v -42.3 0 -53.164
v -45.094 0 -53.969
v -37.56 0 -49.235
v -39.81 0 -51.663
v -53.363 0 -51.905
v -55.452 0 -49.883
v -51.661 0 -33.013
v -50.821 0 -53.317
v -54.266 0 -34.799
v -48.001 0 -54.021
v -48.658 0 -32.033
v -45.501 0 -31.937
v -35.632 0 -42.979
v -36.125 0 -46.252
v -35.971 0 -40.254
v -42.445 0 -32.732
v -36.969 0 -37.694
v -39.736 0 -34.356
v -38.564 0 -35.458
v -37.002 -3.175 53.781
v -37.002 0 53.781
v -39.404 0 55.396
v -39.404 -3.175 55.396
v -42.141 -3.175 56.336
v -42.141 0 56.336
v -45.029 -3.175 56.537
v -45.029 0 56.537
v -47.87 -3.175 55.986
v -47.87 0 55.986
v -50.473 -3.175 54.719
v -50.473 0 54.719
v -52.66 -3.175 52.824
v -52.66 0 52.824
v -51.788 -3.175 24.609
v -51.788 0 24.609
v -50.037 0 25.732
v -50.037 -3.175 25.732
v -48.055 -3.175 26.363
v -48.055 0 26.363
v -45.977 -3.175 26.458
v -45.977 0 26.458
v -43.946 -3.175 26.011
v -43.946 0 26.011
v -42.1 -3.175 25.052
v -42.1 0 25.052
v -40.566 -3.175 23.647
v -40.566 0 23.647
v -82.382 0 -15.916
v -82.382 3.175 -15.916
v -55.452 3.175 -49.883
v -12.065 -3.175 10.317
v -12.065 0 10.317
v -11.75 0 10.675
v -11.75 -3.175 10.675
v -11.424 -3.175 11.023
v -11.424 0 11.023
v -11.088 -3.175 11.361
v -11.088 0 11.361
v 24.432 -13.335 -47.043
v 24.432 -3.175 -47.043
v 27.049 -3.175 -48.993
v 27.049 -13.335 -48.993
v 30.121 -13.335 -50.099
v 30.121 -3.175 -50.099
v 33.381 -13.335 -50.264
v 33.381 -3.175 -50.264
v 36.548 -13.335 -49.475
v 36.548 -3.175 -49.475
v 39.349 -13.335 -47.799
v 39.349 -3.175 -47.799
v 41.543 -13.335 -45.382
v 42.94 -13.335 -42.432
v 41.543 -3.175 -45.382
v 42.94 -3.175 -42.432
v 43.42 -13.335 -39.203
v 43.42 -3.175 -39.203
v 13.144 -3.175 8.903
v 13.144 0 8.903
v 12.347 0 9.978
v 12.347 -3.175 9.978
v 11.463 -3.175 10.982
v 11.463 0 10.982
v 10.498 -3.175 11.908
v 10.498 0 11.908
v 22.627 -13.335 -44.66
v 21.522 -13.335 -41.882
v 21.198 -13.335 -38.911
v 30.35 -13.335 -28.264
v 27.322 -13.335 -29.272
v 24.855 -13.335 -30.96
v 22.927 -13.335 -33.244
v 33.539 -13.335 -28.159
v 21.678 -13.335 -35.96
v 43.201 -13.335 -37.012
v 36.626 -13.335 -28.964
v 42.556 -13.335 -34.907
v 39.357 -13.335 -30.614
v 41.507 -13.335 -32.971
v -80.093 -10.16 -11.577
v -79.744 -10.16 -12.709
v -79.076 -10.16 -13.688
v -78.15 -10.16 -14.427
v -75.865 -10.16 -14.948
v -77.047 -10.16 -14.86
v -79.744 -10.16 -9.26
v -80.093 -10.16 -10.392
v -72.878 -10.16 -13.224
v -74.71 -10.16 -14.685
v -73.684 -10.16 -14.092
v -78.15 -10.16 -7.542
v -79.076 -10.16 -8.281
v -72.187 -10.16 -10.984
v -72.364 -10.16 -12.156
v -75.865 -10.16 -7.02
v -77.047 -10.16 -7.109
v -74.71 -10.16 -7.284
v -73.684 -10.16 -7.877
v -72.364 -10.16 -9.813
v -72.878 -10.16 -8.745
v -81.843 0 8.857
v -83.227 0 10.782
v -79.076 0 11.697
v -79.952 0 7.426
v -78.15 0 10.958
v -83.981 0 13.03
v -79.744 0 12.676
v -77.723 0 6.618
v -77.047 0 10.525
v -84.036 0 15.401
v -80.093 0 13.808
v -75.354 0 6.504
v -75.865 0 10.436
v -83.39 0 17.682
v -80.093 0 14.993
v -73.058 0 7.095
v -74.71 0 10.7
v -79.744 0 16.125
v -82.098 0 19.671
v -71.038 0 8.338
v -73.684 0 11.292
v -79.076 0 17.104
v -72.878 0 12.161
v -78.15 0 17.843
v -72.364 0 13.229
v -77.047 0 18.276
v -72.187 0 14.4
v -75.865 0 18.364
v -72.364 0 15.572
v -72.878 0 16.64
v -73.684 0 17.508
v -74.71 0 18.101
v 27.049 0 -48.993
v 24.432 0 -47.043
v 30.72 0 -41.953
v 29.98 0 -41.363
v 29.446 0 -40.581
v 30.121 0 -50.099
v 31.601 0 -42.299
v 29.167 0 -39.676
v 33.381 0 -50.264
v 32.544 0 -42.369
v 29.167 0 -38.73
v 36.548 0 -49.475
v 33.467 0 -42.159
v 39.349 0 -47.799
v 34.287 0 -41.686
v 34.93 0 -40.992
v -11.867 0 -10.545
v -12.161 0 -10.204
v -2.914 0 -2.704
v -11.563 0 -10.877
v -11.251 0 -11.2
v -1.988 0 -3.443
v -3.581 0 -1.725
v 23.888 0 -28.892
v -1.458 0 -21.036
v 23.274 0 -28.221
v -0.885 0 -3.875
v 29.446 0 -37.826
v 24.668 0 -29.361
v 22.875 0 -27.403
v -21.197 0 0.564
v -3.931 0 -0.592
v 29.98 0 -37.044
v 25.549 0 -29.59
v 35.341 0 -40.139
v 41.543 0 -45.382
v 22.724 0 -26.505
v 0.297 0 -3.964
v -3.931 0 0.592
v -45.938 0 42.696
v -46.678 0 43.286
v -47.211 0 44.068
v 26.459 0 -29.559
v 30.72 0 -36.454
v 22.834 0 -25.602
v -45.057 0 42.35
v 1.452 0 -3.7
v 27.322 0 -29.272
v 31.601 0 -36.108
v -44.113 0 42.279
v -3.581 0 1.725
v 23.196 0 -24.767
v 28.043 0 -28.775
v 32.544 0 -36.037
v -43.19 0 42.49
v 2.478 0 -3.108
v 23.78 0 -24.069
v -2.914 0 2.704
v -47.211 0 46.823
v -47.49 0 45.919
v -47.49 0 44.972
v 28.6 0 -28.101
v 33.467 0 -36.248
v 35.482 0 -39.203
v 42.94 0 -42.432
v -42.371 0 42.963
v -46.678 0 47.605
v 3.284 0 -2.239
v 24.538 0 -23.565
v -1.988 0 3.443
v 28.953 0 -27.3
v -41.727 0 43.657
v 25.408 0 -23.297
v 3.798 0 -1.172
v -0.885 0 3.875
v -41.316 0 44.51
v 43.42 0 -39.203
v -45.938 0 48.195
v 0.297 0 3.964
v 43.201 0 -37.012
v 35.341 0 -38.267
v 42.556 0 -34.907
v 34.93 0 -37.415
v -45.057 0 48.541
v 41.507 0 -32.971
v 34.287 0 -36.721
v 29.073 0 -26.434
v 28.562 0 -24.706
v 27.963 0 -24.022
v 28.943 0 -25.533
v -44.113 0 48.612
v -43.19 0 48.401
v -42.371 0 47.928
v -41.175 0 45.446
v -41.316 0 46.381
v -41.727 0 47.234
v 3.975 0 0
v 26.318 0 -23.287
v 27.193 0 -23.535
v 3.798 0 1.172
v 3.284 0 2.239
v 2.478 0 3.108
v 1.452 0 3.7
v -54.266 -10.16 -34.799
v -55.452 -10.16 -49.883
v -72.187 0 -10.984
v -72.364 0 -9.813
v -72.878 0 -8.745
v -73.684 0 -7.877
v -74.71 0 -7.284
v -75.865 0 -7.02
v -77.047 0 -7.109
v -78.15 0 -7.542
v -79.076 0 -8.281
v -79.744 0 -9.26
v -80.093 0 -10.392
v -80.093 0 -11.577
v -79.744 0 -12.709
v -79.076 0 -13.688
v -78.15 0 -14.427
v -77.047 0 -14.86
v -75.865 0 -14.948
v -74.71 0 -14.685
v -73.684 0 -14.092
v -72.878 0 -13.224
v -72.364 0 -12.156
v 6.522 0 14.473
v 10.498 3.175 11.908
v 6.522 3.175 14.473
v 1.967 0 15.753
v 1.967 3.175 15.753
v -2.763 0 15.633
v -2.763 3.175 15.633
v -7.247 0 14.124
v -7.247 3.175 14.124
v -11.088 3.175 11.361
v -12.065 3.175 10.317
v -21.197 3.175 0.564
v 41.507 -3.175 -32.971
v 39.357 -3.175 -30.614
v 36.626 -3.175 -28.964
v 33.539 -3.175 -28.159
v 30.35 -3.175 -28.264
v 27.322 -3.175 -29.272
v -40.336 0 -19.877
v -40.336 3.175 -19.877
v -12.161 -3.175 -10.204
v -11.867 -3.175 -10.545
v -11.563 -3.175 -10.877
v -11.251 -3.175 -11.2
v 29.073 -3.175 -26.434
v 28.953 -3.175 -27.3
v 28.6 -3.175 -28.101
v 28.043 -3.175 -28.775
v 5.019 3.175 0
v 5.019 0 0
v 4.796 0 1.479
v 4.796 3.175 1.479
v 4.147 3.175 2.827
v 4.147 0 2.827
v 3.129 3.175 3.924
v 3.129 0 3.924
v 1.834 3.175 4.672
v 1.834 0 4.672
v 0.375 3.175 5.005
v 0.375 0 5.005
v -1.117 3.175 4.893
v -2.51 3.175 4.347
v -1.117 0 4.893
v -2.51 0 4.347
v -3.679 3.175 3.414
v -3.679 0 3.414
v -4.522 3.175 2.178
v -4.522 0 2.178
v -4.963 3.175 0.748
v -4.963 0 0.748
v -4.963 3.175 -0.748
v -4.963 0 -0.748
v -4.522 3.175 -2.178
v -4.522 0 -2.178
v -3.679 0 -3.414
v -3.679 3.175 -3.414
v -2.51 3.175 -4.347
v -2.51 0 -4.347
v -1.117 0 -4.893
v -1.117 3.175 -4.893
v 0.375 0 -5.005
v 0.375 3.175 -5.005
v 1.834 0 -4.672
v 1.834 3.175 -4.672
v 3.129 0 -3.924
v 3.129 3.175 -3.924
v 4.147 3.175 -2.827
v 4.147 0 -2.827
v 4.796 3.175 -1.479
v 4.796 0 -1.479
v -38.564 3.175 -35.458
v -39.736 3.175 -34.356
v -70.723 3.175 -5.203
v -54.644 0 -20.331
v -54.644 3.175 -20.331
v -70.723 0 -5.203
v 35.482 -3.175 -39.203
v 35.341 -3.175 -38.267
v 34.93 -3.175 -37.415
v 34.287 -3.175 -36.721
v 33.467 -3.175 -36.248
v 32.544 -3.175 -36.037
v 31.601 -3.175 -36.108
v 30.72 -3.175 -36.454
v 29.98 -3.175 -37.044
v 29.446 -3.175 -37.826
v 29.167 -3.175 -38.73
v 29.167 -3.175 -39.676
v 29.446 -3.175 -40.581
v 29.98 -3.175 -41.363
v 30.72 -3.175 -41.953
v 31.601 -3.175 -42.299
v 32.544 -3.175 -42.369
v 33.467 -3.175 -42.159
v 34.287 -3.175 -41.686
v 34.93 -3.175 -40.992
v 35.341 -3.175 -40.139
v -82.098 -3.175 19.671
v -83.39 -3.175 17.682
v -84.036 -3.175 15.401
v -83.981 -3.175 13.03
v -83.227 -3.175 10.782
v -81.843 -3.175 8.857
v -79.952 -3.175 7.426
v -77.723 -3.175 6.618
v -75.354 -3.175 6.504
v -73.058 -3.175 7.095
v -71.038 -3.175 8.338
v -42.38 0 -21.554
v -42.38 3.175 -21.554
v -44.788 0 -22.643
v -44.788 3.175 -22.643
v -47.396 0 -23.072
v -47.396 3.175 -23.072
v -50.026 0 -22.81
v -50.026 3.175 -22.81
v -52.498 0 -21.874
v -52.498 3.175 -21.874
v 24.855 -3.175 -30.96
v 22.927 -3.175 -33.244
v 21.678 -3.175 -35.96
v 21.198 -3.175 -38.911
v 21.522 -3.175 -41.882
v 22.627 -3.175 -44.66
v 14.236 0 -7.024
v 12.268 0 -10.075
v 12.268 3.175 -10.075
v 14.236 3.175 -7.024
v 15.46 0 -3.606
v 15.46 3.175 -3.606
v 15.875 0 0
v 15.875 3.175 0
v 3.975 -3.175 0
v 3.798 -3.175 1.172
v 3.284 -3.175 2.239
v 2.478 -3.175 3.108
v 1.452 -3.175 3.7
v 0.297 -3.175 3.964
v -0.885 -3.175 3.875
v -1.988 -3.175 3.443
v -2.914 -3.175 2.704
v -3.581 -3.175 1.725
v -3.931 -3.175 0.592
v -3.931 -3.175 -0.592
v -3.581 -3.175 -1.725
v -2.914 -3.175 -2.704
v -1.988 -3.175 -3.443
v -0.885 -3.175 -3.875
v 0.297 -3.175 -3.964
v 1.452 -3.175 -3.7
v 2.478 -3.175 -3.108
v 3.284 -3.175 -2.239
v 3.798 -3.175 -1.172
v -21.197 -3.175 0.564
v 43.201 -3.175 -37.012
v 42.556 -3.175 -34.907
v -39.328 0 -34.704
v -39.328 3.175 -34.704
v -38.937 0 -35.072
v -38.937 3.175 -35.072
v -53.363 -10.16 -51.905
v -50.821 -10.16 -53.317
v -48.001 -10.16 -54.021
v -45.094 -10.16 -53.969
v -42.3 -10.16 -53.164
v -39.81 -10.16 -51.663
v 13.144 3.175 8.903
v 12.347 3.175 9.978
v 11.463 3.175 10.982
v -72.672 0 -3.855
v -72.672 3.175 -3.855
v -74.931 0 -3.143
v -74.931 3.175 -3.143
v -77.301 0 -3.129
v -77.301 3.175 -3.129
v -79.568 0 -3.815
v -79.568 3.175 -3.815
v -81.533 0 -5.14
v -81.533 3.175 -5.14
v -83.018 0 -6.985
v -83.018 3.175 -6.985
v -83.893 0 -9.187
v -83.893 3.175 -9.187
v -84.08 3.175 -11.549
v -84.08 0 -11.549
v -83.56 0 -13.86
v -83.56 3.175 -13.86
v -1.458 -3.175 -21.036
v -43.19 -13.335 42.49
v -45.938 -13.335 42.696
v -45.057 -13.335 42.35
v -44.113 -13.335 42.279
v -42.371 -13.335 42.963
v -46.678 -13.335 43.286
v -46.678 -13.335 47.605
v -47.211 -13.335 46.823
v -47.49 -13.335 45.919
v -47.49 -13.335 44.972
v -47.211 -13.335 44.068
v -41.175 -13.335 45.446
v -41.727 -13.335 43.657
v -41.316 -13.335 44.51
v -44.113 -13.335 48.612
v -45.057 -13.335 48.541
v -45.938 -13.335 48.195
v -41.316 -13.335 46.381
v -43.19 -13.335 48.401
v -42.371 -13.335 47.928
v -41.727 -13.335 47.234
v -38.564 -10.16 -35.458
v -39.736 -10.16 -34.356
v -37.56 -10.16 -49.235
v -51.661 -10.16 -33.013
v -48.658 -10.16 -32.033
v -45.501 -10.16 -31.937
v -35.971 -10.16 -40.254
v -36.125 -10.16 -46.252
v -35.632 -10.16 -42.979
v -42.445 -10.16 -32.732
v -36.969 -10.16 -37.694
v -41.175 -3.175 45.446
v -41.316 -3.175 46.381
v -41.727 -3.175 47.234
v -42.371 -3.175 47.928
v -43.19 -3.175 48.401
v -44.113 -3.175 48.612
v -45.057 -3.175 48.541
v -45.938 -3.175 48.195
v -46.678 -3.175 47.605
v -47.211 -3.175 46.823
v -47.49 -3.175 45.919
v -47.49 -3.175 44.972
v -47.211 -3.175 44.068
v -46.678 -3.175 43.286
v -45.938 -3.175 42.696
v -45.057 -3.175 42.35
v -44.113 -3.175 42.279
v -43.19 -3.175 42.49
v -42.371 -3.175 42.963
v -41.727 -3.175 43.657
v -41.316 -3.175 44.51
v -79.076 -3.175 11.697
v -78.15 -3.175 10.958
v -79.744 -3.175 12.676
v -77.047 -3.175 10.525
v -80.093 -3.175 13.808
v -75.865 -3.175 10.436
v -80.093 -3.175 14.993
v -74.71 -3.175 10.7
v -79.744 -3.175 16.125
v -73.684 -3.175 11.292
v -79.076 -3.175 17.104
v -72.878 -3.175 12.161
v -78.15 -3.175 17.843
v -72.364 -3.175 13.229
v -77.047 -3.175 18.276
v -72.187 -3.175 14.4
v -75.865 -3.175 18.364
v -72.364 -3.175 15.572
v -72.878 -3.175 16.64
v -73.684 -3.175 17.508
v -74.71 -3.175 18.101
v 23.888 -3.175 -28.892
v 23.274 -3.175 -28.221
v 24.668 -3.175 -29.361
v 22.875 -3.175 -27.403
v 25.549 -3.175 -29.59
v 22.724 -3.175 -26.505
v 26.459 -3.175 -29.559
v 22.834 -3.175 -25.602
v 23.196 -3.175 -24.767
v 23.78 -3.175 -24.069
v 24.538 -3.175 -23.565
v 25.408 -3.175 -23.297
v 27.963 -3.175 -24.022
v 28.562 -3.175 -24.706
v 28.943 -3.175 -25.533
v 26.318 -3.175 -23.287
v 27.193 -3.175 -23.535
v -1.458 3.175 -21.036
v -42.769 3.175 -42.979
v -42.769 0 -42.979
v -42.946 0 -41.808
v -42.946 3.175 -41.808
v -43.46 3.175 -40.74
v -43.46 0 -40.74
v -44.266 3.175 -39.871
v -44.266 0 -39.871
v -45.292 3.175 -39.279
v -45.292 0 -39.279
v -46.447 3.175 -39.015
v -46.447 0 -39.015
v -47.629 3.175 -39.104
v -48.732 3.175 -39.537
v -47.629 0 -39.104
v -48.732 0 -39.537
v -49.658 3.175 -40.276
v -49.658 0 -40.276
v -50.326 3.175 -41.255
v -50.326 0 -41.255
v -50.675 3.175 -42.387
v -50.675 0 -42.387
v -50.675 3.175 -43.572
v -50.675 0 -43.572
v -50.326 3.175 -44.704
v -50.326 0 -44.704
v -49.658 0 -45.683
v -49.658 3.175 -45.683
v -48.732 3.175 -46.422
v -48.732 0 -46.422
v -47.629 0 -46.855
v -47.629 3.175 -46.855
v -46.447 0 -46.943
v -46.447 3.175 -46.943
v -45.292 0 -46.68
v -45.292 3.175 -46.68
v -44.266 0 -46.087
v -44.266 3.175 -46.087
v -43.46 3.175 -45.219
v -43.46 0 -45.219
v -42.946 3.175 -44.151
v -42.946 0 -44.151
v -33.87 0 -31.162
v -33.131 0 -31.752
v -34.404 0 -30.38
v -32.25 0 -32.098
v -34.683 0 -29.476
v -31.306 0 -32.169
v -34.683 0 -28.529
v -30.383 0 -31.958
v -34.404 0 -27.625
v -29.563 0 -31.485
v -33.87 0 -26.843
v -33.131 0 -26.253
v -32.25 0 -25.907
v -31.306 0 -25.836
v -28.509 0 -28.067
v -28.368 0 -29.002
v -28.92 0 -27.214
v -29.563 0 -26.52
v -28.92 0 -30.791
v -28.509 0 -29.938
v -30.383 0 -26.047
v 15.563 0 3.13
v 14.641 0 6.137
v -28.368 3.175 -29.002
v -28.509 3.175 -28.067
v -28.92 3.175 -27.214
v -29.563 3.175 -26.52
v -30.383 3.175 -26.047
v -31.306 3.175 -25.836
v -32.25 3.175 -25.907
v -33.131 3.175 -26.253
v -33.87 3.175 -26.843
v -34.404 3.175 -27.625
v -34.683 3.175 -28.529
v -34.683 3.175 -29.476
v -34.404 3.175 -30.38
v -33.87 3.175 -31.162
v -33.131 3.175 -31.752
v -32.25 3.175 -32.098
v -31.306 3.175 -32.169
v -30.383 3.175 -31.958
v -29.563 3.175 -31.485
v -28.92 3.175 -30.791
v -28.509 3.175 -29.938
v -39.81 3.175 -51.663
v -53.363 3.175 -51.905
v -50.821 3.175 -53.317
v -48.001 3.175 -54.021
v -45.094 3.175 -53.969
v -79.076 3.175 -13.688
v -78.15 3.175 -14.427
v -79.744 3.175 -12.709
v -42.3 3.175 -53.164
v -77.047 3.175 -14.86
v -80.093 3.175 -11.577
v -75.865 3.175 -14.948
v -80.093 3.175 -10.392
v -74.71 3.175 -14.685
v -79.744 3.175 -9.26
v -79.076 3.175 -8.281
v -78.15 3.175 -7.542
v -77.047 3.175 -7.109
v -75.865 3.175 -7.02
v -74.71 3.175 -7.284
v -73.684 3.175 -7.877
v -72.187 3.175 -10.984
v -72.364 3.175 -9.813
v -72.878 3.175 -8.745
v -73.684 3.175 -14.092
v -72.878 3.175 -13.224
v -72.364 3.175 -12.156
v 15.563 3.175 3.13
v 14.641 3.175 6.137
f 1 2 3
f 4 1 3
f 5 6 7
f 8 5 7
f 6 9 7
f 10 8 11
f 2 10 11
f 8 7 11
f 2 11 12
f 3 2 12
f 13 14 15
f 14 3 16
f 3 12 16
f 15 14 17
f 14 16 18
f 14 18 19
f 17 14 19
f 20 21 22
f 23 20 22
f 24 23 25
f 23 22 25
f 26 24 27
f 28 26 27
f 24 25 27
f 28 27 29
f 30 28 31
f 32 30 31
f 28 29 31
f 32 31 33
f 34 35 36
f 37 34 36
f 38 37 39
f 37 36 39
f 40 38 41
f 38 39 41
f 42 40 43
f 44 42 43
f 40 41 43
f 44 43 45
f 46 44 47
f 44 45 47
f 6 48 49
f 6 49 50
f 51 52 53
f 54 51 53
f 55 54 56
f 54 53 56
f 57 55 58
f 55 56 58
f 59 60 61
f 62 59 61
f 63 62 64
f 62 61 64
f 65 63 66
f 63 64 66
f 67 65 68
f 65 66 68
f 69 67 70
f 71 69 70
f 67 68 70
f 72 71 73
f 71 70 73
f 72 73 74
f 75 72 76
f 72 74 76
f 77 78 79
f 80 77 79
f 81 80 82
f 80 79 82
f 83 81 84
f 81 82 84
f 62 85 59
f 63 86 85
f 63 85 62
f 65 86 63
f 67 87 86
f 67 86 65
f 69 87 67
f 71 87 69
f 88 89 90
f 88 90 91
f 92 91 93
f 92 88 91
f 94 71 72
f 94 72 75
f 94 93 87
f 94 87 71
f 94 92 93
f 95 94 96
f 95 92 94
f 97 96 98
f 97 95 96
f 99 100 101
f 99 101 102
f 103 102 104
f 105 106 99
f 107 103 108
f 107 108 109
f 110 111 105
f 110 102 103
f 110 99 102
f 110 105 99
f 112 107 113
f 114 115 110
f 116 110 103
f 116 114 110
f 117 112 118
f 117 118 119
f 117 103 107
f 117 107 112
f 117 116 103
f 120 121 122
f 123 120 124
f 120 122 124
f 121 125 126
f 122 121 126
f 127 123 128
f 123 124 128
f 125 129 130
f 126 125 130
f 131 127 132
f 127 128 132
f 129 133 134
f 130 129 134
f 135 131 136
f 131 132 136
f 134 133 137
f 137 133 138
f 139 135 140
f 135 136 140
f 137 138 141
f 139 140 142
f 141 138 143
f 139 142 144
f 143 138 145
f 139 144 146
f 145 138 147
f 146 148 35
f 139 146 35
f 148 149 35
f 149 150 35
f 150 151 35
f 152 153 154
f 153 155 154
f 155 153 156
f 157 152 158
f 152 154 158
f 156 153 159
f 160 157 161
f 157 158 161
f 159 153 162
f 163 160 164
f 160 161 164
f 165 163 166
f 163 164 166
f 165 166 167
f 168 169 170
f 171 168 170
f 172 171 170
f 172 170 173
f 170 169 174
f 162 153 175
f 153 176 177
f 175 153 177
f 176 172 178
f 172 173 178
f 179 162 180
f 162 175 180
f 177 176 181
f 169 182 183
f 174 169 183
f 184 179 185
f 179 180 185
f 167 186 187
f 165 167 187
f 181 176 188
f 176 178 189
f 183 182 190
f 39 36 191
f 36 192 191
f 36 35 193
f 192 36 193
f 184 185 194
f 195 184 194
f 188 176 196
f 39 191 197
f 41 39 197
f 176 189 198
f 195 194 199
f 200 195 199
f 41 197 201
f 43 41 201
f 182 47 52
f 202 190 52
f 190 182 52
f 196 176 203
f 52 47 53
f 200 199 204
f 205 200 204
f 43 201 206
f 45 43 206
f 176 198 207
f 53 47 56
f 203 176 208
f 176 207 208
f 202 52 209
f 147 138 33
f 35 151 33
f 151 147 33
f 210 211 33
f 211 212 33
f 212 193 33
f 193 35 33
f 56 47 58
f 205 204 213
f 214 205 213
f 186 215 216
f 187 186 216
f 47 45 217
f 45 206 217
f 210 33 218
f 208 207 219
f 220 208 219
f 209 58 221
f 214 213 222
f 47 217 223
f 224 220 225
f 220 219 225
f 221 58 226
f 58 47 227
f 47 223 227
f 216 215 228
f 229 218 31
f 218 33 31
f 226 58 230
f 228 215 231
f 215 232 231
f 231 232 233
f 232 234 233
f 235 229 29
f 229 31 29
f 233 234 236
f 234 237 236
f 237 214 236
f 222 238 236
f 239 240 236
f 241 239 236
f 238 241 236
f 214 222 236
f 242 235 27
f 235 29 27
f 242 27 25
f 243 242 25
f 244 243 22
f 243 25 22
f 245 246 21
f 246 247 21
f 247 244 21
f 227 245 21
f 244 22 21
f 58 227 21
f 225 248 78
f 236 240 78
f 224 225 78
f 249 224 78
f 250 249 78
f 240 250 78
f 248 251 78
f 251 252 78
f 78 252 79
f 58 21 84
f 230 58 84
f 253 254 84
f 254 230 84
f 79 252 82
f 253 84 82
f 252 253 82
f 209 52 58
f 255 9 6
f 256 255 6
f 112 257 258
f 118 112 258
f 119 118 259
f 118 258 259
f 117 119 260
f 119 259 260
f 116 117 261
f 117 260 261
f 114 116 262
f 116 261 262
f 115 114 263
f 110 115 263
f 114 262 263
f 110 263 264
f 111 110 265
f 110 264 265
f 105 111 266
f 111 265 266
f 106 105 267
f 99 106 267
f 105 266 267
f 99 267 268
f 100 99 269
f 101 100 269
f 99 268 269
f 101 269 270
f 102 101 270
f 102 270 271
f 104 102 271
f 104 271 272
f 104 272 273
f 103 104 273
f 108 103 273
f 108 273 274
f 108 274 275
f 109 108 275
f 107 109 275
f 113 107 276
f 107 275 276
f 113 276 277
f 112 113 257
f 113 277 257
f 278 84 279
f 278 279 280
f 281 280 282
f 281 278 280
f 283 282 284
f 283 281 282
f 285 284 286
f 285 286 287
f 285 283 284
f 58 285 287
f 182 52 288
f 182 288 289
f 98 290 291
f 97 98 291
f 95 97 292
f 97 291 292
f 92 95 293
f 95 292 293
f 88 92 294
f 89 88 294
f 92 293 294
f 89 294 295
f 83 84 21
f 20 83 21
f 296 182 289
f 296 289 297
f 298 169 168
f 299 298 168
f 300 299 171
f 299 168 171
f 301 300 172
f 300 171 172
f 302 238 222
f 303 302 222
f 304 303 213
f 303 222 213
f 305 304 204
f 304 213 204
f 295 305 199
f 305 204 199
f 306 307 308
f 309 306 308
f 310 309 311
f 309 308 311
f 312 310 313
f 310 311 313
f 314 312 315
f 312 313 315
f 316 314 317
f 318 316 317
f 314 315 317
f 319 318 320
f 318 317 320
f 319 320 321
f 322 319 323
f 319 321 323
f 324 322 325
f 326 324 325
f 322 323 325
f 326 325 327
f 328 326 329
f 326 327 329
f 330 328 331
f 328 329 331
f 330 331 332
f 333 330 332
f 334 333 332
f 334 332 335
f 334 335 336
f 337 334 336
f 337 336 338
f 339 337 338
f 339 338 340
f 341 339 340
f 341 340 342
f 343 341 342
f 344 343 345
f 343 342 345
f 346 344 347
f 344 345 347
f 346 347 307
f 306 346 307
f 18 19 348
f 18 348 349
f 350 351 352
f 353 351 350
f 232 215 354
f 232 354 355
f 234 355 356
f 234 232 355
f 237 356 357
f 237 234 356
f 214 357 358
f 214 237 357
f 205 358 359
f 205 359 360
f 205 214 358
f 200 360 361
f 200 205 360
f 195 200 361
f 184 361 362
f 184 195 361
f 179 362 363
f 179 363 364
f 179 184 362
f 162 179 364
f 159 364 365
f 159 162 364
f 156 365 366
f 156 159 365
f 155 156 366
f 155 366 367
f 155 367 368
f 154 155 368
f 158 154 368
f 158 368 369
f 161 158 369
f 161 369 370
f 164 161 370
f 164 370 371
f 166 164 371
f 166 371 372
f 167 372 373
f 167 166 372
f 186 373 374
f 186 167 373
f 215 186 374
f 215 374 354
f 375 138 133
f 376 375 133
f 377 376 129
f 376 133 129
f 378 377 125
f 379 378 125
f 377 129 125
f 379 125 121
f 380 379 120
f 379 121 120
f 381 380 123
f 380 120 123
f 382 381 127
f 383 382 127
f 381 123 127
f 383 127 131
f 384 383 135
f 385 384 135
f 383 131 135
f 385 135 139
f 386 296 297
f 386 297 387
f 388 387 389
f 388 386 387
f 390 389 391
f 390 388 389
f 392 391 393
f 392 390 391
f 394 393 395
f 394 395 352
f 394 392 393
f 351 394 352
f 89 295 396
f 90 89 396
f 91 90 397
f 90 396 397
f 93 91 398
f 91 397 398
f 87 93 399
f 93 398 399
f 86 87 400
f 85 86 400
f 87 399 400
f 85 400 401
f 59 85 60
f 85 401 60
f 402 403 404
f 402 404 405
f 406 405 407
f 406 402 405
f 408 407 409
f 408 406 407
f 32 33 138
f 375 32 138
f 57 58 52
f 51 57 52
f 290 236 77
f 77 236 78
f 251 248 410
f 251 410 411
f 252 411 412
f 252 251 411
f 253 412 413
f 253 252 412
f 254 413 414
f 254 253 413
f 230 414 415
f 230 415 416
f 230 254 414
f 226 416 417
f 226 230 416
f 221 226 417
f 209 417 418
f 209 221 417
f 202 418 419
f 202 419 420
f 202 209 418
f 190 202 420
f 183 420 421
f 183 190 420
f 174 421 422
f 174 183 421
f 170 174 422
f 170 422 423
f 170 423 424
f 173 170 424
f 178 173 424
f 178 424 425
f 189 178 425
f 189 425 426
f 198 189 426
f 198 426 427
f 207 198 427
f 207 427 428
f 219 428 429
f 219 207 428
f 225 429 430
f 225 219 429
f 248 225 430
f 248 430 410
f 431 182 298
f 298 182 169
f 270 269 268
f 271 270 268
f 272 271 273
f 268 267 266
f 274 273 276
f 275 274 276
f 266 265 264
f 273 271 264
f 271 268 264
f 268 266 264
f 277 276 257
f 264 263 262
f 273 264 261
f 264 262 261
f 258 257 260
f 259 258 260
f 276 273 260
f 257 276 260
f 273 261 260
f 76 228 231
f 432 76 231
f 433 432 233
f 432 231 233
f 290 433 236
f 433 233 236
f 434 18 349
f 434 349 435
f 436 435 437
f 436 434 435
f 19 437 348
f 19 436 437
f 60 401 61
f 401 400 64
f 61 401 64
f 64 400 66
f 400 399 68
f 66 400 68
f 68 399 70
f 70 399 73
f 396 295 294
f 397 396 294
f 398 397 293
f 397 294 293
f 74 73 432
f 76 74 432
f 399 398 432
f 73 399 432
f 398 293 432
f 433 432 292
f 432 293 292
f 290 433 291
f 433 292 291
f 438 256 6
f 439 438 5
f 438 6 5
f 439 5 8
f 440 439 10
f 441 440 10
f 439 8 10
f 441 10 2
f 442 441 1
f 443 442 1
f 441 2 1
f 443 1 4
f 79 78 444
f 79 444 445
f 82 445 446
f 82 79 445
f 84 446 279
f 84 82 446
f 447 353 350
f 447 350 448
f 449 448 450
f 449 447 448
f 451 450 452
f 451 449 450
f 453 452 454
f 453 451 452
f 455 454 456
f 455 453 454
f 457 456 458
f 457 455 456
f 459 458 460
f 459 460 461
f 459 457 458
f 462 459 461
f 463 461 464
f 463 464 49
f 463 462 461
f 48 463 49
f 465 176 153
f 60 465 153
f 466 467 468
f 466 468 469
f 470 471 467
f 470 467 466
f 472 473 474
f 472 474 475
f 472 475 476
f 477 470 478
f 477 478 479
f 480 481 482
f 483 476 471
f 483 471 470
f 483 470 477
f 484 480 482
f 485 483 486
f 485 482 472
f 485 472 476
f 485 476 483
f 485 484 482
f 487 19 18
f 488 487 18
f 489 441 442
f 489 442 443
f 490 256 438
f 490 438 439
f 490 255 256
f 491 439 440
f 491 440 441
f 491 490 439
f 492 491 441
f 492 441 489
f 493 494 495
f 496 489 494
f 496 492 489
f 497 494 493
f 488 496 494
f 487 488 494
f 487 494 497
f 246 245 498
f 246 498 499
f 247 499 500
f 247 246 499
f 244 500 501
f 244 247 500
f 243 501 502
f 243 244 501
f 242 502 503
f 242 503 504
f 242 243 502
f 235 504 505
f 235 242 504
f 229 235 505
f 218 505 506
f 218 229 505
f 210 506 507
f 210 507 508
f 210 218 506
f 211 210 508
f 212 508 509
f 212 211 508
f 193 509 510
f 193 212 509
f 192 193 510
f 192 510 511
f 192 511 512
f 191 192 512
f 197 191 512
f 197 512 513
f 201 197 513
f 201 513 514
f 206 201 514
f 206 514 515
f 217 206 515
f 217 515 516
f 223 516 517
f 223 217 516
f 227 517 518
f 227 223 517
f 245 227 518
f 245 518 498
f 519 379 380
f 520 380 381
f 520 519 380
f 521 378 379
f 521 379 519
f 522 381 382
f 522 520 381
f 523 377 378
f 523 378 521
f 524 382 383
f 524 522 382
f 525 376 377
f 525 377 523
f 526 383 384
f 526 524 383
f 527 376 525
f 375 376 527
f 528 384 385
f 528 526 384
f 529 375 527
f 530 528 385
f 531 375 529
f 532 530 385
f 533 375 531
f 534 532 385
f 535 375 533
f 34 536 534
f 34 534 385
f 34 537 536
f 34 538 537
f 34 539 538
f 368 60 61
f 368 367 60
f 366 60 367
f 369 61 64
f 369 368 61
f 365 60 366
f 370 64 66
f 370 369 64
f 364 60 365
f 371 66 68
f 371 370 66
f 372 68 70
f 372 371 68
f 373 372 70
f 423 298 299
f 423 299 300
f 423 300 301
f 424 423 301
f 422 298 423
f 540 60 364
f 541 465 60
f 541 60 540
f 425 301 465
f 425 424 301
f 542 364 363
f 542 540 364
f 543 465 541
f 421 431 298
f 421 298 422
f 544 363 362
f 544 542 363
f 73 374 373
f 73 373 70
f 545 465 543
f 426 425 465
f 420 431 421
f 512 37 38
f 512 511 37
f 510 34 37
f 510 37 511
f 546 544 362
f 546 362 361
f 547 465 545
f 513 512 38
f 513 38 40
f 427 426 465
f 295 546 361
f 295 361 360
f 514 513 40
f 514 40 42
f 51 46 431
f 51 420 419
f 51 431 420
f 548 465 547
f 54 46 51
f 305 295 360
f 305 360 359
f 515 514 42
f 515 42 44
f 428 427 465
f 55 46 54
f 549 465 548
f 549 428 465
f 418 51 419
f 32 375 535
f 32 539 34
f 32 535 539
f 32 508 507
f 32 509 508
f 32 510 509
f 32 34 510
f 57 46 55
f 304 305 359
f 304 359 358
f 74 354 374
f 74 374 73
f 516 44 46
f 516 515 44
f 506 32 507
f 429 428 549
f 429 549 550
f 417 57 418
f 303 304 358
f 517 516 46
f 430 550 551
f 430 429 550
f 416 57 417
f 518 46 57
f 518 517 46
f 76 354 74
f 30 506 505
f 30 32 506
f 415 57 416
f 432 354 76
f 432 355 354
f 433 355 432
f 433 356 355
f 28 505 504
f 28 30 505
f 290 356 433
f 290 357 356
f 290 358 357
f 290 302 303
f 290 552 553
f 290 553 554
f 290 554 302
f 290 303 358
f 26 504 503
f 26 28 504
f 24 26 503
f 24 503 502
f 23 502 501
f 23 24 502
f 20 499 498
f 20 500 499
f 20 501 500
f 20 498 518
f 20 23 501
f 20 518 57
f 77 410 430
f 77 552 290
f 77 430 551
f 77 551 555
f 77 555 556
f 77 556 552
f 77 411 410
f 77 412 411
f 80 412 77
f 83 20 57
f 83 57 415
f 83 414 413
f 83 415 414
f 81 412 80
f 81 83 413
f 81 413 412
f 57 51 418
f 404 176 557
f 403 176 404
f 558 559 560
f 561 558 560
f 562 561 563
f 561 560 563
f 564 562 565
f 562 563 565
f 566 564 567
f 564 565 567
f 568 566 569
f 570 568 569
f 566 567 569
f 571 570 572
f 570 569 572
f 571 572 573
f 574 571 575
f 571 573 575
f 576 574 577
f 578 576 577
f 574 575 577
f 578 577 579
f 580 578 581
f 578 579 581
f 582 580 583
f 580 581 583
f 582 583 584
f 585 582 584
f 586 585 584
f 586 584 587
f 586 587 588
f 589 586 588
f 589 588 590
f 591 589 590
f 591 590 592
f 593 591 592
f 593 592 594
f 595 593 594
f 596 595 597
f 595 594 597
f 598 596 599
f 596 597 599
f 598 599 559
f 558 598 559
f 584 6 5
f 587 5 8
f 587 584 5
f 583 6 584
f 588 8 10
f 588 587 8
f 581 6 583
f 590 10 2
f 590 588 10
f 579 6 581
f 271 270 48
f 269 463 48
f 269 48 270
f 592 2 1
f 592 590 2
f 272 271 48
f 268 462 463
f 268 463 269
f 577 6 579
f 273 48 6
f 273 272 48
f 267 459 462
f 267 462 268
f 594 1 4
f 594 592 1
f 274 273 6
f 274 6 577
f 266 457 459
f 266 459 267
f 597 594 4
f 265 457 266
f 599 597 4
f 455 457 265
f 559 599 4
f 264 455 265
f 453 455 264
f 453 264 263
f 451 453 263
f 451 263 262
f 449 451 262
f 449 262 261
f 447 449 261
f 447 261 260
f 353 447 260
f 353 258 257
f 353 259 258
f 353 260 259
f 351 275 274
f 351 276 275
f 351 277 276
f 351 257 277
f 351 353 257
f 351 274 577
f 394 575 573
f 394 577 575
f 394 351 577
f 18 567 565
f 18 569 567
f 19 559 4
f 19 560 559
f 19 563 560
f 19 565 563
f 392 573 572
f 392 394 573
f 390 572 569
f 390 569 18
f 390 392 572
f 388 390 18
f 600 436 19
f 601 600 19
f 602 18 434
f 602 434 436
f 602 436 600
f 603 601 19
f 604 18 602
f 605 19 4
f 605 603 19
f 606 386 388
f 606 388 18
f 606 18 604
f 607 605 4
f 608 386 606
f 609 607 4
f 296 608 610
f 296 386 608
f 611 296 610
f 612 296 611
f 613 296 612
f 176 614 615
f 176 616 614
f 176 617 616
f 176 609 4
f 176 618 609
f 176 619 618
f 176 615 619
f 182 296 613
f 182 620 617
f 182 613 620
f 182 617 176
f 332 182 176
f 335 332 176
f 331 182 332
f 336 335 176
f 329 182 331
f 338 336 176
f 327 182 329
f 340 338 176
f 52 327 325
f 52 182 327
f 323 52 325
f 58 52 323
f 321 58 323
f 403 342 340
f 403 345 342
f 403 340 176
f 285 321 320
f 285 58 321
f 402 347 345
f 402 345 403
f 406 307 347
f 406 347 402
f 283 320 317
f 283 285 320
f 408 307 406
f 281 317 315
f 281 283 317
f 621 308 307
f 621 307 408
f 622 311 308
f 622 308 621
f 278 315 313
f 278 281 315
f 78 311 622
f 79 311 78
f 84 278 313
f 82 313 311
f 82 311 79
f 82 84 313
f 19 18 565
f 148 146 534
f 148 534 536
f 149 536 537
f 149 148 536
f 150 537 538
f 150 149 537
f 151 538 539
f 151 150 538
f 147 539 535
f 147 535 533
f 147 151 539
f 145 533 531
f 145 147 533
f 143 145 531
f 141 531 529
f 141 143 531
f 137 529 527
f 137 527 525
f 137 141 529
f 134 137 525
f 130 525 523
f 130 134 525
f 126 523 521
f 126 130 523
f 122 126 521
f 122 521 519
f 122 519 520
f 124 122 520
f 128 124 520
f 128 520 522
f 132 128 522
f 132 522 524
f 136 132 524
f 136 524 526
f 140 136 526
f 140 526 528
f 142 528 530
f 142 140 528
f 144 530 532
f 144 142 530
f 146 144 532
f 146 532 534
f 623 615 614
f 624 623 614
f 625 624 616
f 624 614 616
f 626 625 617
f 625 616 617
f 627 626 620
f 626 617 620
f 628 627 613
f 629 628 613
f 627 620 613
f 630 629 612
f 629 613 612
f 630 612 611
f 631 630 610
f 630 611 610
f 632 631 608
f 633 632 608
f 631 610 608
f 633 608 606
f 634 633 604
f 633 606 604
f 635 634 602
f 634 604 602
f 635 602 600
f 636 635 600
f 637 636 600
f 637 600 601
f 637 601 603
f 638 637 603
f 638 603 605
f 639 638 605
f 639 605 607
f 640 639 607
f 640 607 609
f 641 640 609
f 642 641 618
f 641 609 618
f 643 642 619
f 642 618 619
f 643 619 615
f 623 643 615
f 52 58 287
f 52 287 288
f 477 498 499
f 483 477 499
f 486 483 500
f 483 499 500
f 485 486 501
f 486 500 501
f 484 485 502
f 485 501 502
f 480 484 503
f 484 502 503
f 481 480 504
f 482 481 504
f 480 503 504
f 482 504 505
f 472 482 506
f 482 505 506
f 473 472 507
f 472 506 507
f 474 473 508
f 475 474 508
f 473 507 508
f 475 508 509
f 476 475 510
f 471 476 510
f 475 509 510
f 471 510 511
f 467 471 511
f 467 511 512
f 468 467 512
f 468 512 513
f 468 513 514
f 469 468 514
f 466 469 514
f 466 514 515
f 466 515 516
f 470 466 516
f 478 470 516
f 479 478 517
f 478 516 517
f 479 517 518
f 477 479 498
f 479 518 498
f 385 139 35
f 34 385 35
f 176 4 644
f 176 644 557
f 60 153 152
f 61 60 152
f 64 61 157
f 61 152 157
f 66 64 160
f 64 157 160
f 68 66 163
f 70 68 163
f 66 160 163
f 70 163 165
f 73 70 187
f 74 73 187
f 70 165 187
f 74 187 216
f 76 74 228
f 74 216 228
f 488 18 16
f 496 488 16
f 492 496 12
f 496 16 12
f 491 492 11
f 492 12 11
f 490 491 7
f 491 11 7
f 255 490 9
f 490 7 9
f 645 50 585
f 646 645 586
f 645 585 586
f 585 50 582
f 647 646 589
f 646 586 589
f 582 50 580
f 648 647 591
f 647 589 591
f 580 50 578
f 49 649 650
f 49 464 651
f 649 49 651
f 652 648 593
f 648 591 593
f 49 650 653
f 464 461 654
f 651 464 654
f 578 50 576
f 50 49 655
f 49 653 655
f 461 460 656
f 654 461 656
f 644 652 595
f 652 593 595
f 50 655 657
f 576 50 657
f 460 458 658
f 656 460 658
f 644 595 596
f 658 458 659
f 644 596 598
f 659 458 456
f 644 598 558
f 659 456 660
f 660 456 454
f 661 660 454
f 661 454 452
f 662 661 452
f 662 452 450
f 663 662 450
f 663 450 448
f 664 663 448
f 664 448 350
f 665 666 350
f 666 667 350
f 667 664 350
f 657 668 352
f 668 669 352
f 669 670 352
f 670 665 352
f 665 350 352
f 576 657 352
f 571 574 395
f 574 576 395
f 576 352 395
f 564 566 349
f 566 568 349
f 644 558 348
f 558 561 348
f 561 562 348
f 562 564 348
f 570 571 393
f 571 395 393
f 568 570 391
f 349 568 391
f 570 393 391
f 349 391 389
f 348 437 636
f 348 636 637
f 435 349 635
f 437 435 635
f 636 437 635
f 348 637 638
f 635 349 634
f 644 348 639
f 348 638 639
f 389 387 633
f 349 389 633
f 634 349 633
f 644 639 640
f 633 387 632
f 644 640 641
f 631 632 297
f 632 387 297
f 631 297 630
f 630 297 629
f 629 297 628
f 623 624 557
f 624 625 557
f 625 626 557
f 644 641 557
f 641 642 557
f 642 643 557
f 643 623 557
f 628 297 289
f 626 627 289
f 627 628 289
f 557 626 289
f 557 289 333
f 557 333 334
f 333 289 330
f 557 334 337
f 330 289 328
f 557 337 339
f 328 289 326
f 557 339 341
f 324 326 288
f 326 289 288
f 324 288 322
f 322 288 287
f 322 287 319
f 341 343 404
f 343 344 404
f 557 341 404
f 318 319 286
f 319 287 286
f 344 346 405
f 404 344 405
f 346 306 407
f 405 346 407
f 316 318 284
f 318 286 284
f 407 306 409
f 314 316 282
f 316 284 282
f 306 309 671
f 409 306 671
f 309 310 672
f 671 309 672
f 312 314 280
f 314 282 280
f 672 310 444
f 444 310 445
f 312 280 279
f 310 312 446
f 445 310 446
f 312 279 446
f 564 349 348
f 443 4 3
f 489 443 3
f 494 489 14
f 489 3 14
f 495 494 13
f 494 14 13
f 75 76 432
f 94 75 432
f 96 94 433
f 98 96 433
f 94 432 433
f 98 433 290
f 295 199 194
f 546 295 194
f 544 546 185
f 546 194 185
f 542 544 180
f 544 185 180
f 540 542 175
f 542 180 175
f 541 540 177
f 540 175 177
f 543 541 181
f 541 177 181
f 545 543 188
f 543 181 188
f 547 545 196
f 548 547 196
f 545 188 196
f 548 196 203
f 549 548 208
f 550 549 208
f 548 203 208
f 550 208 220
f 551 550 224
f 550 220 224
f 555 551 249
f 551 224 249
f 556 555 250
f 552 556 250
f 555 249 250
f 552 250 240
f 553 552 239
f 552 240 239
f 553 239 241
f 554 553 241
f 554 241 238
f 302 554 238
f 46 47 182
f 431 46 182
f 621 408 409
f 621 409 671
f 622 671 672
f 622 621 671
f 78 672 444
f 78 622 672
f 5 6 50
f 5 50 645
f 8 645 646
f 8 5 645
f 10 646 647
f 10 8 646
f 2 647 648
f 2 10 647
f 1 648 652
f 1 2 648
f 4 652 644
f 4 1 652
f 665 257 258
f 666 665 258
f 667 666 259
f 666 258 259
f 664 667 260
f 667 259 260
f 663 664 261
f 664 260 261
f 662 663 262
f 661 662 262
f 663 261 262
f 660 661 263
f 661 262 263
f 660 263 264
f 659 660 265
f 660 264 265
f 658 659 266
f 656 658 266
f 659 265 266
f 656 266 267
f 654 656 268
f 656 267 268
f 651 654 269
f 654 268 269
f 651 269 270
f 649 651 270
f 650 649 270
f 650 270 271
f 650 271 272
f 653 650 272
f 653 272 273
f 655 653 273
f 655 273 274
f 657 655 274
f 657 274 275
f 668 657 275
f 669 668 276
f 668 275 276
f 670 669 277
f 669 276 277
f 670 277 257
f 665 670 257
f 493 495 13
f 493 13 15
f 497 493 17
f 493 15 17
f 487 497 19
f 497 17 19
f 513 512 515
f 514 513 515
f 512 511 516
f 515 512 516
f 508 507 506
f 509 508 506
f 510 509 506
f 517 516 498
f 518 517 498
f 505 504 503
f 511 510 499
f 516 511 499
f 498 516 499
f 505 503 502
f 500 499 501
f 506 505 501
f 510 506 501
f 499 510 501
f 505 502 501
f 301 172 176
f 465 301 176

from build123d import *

# Parameters (mm, degrees)
F0_R     = 5.0192058749
F0_R_2   = 3.175
F0_R_3   = 3.9751
F1_DEPTH = 3.175
F2_DEPTH = 3.175
F4_DEPTH = 10.16
F3_R     = 3.175


with BuildPart() as f1:
    # F0 (on Front) → F1 (new body)
    with BuildSketch(Plane.XZ):
        with BuildLine():
            ThreePointArc((-82.0976157368, 19.6705019026), (-73.3433813158, 21.8204159254), (-68.2247198605, 14.4003043691))
            ThreePointArc((-68.2247198605, 14.4003043691), (-68.9624069762, 11.0586579663), (-71.0383515282, 8.338136476))
            Line((-71.0383515282, 8.338136476), (-51.7880564857, 24.6088796977))
            ThreePointArc((-51.7880564857, 24.6088796977), (-45.9772663096, 26.4581873904), (-40.5657834324, 23.6473023906))
            Line((-40.5657834324, 23.6473023906), (-21.1969376927, 0.5644108959))
            Line((-21.1969376927, 0.5644108959), (-12.0653977726, 10.3170636127))
            ThreePointArc((-12.0653977726, 10.3170636127), (-11.5882615315, 10.8502451437), (-11.0875850339, 11.361385616))
            ThreePointArc((-11.0875850339, 11.361385616), (-0.4022179292, 15.8699037722), (10.4978177794, 11.9084611462))
            Line((10.4978177794, 11.9084611462), (-37.0018676901, 53.7814652664))
            ThreePointArc((-37.0018676901, 53.7814652664), (-34.2224687823, 50.0187118354), (-33.2378401357, 45.445542464))
            ThreePointArc((-33.2378401357, 45.445542464), (-34.2706020977, 40.7672375001), (-37.1769244705, 36.9585074138))
            ThreePointArc((-37.1769244705, 36.9585074138), (-52.3033100669, 37.6842329403), (-52.6598943624, 52.8238190109))
            Line((-52.6598943624, 52.8238190109), (-82.0976157368, 19.6705019026))
        make_face()
        with BuildLine():
            ThreePointArc((13.1435640732, 8.9029404386), (11.9158307581, 10.4894519563), (10.4978177794, 11.9084611462))
            ThreePointArc((10.4978177794, 11.9084611462), (-0.4022179292, 15.8699037722), (-11.0875850339, 11.361385616))
            Line((-11.0875850339, 11.361385616), (-12.0653977726, 10.3170636127))
            ThreePointArc((-12.0653977726, 10.3170636127), (-15.8748278931, 0.0739213292), (-12.1609555345, -10.2042533038))
            ThreePointArc((-12.1609555345, -10.2042533038), (-11.7163487615, -10.7118064163), (-11.2505755155, -11.2000078379))
            ThreePointArc((-11.2505755155, -11.2000078379), (-2.5540891897, -15.6681924105), (7.1112039196, -14.1931815959))
            Line((7.1112039196, -14.1931815959), (12.2683930928, -10.0748278358))
            ThreePointArc((12.2683930928, -10.0748278358), (14.946176189, -5.3504618797), (15.875, 0))
            ThreePointArc((15.875, 0), (15.1767866273, 4.6562616624), (13.1435640732, 8.9029404386))
        make_face()
        Circle(F0_R, mode=Mode.SUBTRACT)
        with BuildLine():
            Line((41.5074995689, -32.9712253077), (13.1435640732, 8.9029404386))
            ThreePointArc((13.1435640732, 8.9029404386), (15.1767866273, 4.6562616624), (15.875, 0))
            ThreePointArc((15.875, 0), (14.946176189, -5.3504618797), (12.2683930928, -10.0748278358))
            ThreePointArc((12.2683930928, -10.0748278358), (9.9061801172, -12.404967573), (7.1112039196, -14.1931815959))
            Line((7.1112039196, -14.1931815959), (-1.4583015008, -21.036493657))
            Line((-1.4583015008, -21.036493657), (24.4316018567, -47.0432891013))
            ThreePointArc((24.4316018567, -47.0432891013), (21.3386504244, -37.419226343), (27.3222694847, -29.2715128306))
            ThreePointArc((27.3222694847, -29.2715128306), (35.111487806, -28.4504918444), (41.5074995689, -32.9712253077))
        make_face()
        with BuildLine():
            ThreePointArc((29.0730594479, -26.4338640203), (28.6001412256, -28.1010110043), (27.3222694847, -29.2715128306))
            ThreePointArc((27.3222694847, -29.2715128306), (23.1959776702, -24.7667170362), (29.0730594479, -26.4338640203))
        make_face(mode=Mode.SUBTRACT)
        with BuildLine():
            ThreePointArc((-37.0018676901, 53.7814652664), (-45.0287140261, 56.5373171243), (-52.6598943624, 52.8238190109))
            ThreePointArc((-52.6598943624, 52.8238190109), (-52.3033100669, 37.6842329403), (-37.1769244705, 36.9585074138))
            ThreePointArc((-37.1769244705, 36.9585074138), (-34.2706020977, 40.7672375001), (-33.2378401357, 45.445542464))
            ThreePointArc((-33.2378401357, 45.445542464), (-34.2224687823, 50.0187118354), (-37.0018676901, 53.7814652664))
        make_face()
        with Locations((-44.3503401357, 45.445542464)):
            Circle(F0_R_2, mode=Mode.SUBTRACT)
        with BuildLine():
            ThreePointArc((43.4195047176, -39.2032836147), (42.9307553567, -35.943900451), (41.5074995689, -32.9712253077))
            ThreePointArc((41.5074995689, -32.9712253077), (35.111487806, -28.4504918444), (27.3222694847, -29.2715128306))
            ThreePointArc((27.3222694847, -29.2715128306), (21.3386504244, -37.419226343), (24.4316018567, -47.0432891013))
            ThreePointArc((24.4316018567, -47.0432891013), (36.548009431, -49.4746776424), (43.4195047176, -39.2032836147))
        make_face()
        with Locations((32.3070047176, -39.2032836147)):
            Circle(F0_R_2, mode=Mode.SUBTRACT)
        with BuildLine():
            ThreePointArc((-71.0383515282, 8.338136476), (-68.9624069762, 11.0586579663), (-68.2247198605, 14.4003043691))
            ThreePointArc((-68.2247198605, 14.4003043691), (-73.3433813158, 21.8204159254), (-82.0976157368, 19.6705019026))
            ThreePointArc((-82.0976157368, 19.6705019026), (-81.8429126685, 8.8565118521), (-71.0383515282, 8.338136476))
        make_face()
        with Locations((-76.1622198605, 14.4003043691)):
            Circle(F0_R_3, mode=Mode.SUBTRACT)
        Circle(F0_R)
        Circle(F0_R_3, mode=Mode.SUBTRACT)
        with BuildLine():
            Line((-12.0653977726, 10.3170636127), (-21.1969376927, 0.5644108959))
            Line((-21.1969376927, 0.5644108959), (-12.1609555345, -10.2042533038))
            ThreePointArc((-12.1609555345, -10.2042533038), (-15.8748278931, 0.0739213292), (-12.0653977726, 10.3170636127))
        make_face()
        with BuildLine():
            ThreePointArc((7.1112039196, -14.1931815959), (-2.5540891897, -15.6681924105), (-11.2505755155, -11.2000078379))
            Line((-11.2505755155, -11.2000078379), (-1.4583015008, -21.036493657))
            Line((-1.4583015008, -21.036493657), (7.1112039196, -14.1931815959))
        make_face()
        with BuildLine():
            ThreePointArc((7.1112039196, -14.1931815959), (9.9061801172, -12.404967573), (12.2683930928, -10.0748278358))
            Line((12.2683930928, -10.0748278358), (7.1112039196, -14.1931815959))
        make_face()
    extrude(amount=F1_DEPTH)


with BuildPart() as f2:
    # F0 (on Front) → F2 (new body)
    with BuildSketch(Plane.XZ):
        with BuildLine():
            Line((-12.1609555345, -10.2042533038), (-21.1969376927, 0.5644108959))
            Line((-21.1969376927, 0.5644108959), (-40.3364825574, -19.8769753168))
            ThreePointArc((-40.3364825574, -19.8769753168), (-47.3959924461, -23.0718583423), (-54.6436949702, -20.3305510743))
            Line((-54.6436949702, -20.3305510743), (-70.7233597879, -5.2031589672))
            ThreePointArc((-70.7233597879, -5.2031589672), (-68.8761077945, -7.8353526389), (-68.2247198605, -10.9843964957))
            ThreePointArc((-68.2247198605, -10.9843964957), (-73.5513161122, -18.4802011802), (-82.382096331, -15.9156278776))
            Line((-82.382096331, -15.9156278776), (-55.4521060313, -49.883049003))
            ThreePointArc((-55.4521060313, -49.883049003), (-57.8225624257, -42.1079514503), (-54.2656608596, -34.7990762482))
            ThreePointArc((-54.2656608596, -34.7990762482), (-47.0832153617, -31.8719951294), (-39.7356616255, -34.3556982715))
            ThreePointArc((-39.7356616255, -34.3556982715), (-39.129874871, -34.8855925285), (-38.5640301524, -35.4579431814))
            ThreePointArc((-38.5640301524, -35.4579431814), (-36.3907609409, -38.9429503809), (-35.6317789726, -42.9793250684))
            ThreePointArc((-35.6317789726, -42.9793250684), (-36.7306543832, -47.7975175543), (-39.8099528906, -51.6628023694))
            Line((-39.8099528906, -51.6628023694), (-1.4583015008, -21.036493657))
            Line((-1.4583015008, -21.036493657), (-11.2505755155, -11.2000078379))
            ThreePointArc((-11.2505755155, -11.2000078379), (-11.7163487615, -10.7118064163), (-12.1609555345, -10.2042533038))
        make_face()
        with Locations((-31.5430394507, -29.0024485561)):
            Circle(F0_R_2, mode=Mode.SUBTRACT)
        with BuildLine():
            ThreePointArc((-68.2247198605, -10.9843964957), (-68.8761077945, -7.8353526389), (-70.7233597879, -5.2031589672))
            ThreePointArc((-70.7233597879, -5.2031589672), (-81.5326708837, -5.1395558599), (-82.382096331, -15.9156278776))
            ThreePointArc((-82.382096331, -15.9156278776), (-73.5513161122, -18.4802011802), (-68.2247198605, -10.9843964957))
        make_face()
        with Locations((-76.1622198605, -10.9843964957)):
            Circle(F0_R_3, mode=Mode.SUBTRACT)
        with BuildLine():
            ThreePointArc((-55.4521060313, -49.883049003), (-48.0005460381, -54.0205862875), (-39.8099528906, -51.6628023694))
            ThreePointArc((-39.8099528906, -51.6628023694), (-36.7306543832, -47.7975175543), (-35.6317789726, -42.9793250684))
            ThreePointArc((-35.6317789726, -42.9793250684), (-36.3907609409, -38.9429503809), (-38.5640301524, -35.4579431814))
            Line((-38.5640301524, -35.4579431814), (-39.7356616255, -34.3556982715))
            ThreePointArc((-39.7356616255, -34.3556982715), (-47.0832153617, -31.8719951294), (-54.2656608596, -34.7990762482))
            Line((-54.2656608596, -34.7990762482), (-55.4521060313, -49.883049003))
        make_face()
        with Locations((-46.7442789726, -42.9793250684)):
            Circle(F0_R_3, mode=Mode.SUBTRACT)
        with BuildLine():
            ThreePointArc((13.1435640732, 8.9029404386), (11.9158307581, 10.4894519563), (10.4978177794, 11.9084611462))
            ThreePointArc((10.4978177794, 11.9084611462), (-0.4022179292, 15.8699037722), (-11.0875850339, 11.361385616))
            Line((-11.0875850339, 11.361385616), (-12.0653977726, 10.3170636127))
            ThreePointArc((-12.0653977726, 10.3170636127), (-15.8748278931, 0.0739213292), (-12.1609555345, -10.2042533038))
            ThreePointArc((-12.1609555345, -10.2042533038), (-11.7163487615, -10.7118064163), (-11.2505755155, -11.2000078379))
            ThreePointArc((-11.2505755155, -11.2000078379), (-2.5540891897, -15.6681924105), (7.1112039196, -14.1931815959))
            Line((7.1112039196, -14.1931815959), (12.2683930928, -10.0748278358))
            ThreePointArc((12.2683930928, -10.0748278358), (14.946176189, -5.3504618797), (15.875, 0))
            ThreePointArc((15.875, 0), (15.1767866273, 4.6562616624), (13.1435640732, 8.9029404386))
        make_face()
        Circle(F0_R, mode=Mode.SUBTRACT)
        with BuildLine():
            ThreePointArc((7.1112039196, -14.1931815959), (-2.5540891897, -15.6681924105), (-11.2505755155, -11.2000078379))
            Line((-11.2505755155, -11.2000078379), (-1.4583015008, -21.036493657))
            Line((-1.4583015008, -21.036493657), (7.1112039196, -14.1931815959))
        make_face()
        with BuildLine():
            Line((-12.0653977726, 10.3170636127), (-21.1969376927, 0.5644108959))
            Line((-21.1969376927, 0.5644108959), (-12.1609555345, -10.2042533038))
            ThreePointArc((-12.1609555345, -10.2042533038), (-15.8748278931, 0.0739213292), (-12.0653977726, 10.3170636127))
        make_face()
        with BuildLine():
            ThreePointArc((-54.2656608596, -34.7990762482), (-57.8225624257, -42.1079514503), (-55.4521060313, -49.883049003))
            Line((-55.4521060313, -49.883049003), (-54.2656608596, -34.7990762482))
        make_face()
    extrude(amount=-F2_DEPTH)


with BuildPart() as f4:
    # F0 (on Front) → F4 (new body)
    with BuildSketch(Plane.XZ):
        with Locations((-76.1622198605, -10.9843964957)):
            Circle(F0_R_3)
    extrude(amount=F4_DEPTH)


with BuildPart() as f4b:
    # F0 (on Front) → F4, piece 2 (new body)
    with BuildSketch(Plane.XZ):
        with BuildLine():
            ThreePointArc((-55.4521060313, -49.883049003), (-48.0005460381, -54.0205862875), (-39.8099528906, -51.6628023694))
            ThreePointArc((-39.8099528906, -51.6628023694), (-36.7306543832, -47.7975175543), (-35.6317789726, -42.9793250684))
            ThreePointArc((-35.6317789726, -42.9793250684), (-36.3907609409, -38.9429503809), (-38.5640301524, -35.4579431814))
            Line((-38.5640301524, -35.4579431814), (-39.7356616255, -34.3556982715))
            ThreePointArc((-39.7356616255, -34.3556982715), (-47.0832153617, -31.8719951294), (-54.2656608596, -34.7990762482))
            Line((-54.2656608596, -34.7990762482), (-55.4521060313, -49.883049003))
        make_face()
        with Locations((-46.7442789726, -42.9793250684)):
            Circle(F0_R_3, mode=Mode.SUBTRACT)
        with Locations((-46.7442789726, -42.9793250684)):
            Circle(F0_R_3)
    extrude(amount=F4_DEPTH)


with BuildPart() as f4c:
    # F3 (on face) → F4, piece 3 (new body)
    with BuildSketch(Plane.XZ.offset(3.175)):
        with BuildLine():
            ThreePointArc((24.4316018567, -47.0432891013), (36.548009431, -49.4746776424), (43.4195047176, -39.2032836147))
            ThreePointArc((43.4195047176, -39.2032836147), (42.9307553567, -35.943900451), (41.5074995689, -32.9712253077))
            ThreePointArc((41.5074995689, -32.9712253077), (35.1114877719, -28.4504918355), (27.3222694218, -29.2715128622))
            ThreePointArc((27.3222694218, -29.2715128622), (21.3386504188, -37.4192263777), (24.4316018567, -47.0432891013))
        make_face()
        with Locations((32.3070047176, -39.2032836147)):
            Circle(F3_R, mode=Mode.SUBTRACT)
        with Locations((32.3070047176, -39.2032836147)):
            Circle(F3_R)
    extrude(amount=F4_DEPTH)


with BuildPart() as f4d:
    # F3 (on face) → F4, piece 4 (new body)
    with BuildSketch(Plane.XZ.offset(3.175)):
        with Locations((-44.3503401357, 45.445542464)):
            Circle(F3_R)
    extrude(amount=F4_DEPTH)


solid = Compound([f1.part, f2.part, f4.part, f4b.part, f4c.part, f4d.part])
